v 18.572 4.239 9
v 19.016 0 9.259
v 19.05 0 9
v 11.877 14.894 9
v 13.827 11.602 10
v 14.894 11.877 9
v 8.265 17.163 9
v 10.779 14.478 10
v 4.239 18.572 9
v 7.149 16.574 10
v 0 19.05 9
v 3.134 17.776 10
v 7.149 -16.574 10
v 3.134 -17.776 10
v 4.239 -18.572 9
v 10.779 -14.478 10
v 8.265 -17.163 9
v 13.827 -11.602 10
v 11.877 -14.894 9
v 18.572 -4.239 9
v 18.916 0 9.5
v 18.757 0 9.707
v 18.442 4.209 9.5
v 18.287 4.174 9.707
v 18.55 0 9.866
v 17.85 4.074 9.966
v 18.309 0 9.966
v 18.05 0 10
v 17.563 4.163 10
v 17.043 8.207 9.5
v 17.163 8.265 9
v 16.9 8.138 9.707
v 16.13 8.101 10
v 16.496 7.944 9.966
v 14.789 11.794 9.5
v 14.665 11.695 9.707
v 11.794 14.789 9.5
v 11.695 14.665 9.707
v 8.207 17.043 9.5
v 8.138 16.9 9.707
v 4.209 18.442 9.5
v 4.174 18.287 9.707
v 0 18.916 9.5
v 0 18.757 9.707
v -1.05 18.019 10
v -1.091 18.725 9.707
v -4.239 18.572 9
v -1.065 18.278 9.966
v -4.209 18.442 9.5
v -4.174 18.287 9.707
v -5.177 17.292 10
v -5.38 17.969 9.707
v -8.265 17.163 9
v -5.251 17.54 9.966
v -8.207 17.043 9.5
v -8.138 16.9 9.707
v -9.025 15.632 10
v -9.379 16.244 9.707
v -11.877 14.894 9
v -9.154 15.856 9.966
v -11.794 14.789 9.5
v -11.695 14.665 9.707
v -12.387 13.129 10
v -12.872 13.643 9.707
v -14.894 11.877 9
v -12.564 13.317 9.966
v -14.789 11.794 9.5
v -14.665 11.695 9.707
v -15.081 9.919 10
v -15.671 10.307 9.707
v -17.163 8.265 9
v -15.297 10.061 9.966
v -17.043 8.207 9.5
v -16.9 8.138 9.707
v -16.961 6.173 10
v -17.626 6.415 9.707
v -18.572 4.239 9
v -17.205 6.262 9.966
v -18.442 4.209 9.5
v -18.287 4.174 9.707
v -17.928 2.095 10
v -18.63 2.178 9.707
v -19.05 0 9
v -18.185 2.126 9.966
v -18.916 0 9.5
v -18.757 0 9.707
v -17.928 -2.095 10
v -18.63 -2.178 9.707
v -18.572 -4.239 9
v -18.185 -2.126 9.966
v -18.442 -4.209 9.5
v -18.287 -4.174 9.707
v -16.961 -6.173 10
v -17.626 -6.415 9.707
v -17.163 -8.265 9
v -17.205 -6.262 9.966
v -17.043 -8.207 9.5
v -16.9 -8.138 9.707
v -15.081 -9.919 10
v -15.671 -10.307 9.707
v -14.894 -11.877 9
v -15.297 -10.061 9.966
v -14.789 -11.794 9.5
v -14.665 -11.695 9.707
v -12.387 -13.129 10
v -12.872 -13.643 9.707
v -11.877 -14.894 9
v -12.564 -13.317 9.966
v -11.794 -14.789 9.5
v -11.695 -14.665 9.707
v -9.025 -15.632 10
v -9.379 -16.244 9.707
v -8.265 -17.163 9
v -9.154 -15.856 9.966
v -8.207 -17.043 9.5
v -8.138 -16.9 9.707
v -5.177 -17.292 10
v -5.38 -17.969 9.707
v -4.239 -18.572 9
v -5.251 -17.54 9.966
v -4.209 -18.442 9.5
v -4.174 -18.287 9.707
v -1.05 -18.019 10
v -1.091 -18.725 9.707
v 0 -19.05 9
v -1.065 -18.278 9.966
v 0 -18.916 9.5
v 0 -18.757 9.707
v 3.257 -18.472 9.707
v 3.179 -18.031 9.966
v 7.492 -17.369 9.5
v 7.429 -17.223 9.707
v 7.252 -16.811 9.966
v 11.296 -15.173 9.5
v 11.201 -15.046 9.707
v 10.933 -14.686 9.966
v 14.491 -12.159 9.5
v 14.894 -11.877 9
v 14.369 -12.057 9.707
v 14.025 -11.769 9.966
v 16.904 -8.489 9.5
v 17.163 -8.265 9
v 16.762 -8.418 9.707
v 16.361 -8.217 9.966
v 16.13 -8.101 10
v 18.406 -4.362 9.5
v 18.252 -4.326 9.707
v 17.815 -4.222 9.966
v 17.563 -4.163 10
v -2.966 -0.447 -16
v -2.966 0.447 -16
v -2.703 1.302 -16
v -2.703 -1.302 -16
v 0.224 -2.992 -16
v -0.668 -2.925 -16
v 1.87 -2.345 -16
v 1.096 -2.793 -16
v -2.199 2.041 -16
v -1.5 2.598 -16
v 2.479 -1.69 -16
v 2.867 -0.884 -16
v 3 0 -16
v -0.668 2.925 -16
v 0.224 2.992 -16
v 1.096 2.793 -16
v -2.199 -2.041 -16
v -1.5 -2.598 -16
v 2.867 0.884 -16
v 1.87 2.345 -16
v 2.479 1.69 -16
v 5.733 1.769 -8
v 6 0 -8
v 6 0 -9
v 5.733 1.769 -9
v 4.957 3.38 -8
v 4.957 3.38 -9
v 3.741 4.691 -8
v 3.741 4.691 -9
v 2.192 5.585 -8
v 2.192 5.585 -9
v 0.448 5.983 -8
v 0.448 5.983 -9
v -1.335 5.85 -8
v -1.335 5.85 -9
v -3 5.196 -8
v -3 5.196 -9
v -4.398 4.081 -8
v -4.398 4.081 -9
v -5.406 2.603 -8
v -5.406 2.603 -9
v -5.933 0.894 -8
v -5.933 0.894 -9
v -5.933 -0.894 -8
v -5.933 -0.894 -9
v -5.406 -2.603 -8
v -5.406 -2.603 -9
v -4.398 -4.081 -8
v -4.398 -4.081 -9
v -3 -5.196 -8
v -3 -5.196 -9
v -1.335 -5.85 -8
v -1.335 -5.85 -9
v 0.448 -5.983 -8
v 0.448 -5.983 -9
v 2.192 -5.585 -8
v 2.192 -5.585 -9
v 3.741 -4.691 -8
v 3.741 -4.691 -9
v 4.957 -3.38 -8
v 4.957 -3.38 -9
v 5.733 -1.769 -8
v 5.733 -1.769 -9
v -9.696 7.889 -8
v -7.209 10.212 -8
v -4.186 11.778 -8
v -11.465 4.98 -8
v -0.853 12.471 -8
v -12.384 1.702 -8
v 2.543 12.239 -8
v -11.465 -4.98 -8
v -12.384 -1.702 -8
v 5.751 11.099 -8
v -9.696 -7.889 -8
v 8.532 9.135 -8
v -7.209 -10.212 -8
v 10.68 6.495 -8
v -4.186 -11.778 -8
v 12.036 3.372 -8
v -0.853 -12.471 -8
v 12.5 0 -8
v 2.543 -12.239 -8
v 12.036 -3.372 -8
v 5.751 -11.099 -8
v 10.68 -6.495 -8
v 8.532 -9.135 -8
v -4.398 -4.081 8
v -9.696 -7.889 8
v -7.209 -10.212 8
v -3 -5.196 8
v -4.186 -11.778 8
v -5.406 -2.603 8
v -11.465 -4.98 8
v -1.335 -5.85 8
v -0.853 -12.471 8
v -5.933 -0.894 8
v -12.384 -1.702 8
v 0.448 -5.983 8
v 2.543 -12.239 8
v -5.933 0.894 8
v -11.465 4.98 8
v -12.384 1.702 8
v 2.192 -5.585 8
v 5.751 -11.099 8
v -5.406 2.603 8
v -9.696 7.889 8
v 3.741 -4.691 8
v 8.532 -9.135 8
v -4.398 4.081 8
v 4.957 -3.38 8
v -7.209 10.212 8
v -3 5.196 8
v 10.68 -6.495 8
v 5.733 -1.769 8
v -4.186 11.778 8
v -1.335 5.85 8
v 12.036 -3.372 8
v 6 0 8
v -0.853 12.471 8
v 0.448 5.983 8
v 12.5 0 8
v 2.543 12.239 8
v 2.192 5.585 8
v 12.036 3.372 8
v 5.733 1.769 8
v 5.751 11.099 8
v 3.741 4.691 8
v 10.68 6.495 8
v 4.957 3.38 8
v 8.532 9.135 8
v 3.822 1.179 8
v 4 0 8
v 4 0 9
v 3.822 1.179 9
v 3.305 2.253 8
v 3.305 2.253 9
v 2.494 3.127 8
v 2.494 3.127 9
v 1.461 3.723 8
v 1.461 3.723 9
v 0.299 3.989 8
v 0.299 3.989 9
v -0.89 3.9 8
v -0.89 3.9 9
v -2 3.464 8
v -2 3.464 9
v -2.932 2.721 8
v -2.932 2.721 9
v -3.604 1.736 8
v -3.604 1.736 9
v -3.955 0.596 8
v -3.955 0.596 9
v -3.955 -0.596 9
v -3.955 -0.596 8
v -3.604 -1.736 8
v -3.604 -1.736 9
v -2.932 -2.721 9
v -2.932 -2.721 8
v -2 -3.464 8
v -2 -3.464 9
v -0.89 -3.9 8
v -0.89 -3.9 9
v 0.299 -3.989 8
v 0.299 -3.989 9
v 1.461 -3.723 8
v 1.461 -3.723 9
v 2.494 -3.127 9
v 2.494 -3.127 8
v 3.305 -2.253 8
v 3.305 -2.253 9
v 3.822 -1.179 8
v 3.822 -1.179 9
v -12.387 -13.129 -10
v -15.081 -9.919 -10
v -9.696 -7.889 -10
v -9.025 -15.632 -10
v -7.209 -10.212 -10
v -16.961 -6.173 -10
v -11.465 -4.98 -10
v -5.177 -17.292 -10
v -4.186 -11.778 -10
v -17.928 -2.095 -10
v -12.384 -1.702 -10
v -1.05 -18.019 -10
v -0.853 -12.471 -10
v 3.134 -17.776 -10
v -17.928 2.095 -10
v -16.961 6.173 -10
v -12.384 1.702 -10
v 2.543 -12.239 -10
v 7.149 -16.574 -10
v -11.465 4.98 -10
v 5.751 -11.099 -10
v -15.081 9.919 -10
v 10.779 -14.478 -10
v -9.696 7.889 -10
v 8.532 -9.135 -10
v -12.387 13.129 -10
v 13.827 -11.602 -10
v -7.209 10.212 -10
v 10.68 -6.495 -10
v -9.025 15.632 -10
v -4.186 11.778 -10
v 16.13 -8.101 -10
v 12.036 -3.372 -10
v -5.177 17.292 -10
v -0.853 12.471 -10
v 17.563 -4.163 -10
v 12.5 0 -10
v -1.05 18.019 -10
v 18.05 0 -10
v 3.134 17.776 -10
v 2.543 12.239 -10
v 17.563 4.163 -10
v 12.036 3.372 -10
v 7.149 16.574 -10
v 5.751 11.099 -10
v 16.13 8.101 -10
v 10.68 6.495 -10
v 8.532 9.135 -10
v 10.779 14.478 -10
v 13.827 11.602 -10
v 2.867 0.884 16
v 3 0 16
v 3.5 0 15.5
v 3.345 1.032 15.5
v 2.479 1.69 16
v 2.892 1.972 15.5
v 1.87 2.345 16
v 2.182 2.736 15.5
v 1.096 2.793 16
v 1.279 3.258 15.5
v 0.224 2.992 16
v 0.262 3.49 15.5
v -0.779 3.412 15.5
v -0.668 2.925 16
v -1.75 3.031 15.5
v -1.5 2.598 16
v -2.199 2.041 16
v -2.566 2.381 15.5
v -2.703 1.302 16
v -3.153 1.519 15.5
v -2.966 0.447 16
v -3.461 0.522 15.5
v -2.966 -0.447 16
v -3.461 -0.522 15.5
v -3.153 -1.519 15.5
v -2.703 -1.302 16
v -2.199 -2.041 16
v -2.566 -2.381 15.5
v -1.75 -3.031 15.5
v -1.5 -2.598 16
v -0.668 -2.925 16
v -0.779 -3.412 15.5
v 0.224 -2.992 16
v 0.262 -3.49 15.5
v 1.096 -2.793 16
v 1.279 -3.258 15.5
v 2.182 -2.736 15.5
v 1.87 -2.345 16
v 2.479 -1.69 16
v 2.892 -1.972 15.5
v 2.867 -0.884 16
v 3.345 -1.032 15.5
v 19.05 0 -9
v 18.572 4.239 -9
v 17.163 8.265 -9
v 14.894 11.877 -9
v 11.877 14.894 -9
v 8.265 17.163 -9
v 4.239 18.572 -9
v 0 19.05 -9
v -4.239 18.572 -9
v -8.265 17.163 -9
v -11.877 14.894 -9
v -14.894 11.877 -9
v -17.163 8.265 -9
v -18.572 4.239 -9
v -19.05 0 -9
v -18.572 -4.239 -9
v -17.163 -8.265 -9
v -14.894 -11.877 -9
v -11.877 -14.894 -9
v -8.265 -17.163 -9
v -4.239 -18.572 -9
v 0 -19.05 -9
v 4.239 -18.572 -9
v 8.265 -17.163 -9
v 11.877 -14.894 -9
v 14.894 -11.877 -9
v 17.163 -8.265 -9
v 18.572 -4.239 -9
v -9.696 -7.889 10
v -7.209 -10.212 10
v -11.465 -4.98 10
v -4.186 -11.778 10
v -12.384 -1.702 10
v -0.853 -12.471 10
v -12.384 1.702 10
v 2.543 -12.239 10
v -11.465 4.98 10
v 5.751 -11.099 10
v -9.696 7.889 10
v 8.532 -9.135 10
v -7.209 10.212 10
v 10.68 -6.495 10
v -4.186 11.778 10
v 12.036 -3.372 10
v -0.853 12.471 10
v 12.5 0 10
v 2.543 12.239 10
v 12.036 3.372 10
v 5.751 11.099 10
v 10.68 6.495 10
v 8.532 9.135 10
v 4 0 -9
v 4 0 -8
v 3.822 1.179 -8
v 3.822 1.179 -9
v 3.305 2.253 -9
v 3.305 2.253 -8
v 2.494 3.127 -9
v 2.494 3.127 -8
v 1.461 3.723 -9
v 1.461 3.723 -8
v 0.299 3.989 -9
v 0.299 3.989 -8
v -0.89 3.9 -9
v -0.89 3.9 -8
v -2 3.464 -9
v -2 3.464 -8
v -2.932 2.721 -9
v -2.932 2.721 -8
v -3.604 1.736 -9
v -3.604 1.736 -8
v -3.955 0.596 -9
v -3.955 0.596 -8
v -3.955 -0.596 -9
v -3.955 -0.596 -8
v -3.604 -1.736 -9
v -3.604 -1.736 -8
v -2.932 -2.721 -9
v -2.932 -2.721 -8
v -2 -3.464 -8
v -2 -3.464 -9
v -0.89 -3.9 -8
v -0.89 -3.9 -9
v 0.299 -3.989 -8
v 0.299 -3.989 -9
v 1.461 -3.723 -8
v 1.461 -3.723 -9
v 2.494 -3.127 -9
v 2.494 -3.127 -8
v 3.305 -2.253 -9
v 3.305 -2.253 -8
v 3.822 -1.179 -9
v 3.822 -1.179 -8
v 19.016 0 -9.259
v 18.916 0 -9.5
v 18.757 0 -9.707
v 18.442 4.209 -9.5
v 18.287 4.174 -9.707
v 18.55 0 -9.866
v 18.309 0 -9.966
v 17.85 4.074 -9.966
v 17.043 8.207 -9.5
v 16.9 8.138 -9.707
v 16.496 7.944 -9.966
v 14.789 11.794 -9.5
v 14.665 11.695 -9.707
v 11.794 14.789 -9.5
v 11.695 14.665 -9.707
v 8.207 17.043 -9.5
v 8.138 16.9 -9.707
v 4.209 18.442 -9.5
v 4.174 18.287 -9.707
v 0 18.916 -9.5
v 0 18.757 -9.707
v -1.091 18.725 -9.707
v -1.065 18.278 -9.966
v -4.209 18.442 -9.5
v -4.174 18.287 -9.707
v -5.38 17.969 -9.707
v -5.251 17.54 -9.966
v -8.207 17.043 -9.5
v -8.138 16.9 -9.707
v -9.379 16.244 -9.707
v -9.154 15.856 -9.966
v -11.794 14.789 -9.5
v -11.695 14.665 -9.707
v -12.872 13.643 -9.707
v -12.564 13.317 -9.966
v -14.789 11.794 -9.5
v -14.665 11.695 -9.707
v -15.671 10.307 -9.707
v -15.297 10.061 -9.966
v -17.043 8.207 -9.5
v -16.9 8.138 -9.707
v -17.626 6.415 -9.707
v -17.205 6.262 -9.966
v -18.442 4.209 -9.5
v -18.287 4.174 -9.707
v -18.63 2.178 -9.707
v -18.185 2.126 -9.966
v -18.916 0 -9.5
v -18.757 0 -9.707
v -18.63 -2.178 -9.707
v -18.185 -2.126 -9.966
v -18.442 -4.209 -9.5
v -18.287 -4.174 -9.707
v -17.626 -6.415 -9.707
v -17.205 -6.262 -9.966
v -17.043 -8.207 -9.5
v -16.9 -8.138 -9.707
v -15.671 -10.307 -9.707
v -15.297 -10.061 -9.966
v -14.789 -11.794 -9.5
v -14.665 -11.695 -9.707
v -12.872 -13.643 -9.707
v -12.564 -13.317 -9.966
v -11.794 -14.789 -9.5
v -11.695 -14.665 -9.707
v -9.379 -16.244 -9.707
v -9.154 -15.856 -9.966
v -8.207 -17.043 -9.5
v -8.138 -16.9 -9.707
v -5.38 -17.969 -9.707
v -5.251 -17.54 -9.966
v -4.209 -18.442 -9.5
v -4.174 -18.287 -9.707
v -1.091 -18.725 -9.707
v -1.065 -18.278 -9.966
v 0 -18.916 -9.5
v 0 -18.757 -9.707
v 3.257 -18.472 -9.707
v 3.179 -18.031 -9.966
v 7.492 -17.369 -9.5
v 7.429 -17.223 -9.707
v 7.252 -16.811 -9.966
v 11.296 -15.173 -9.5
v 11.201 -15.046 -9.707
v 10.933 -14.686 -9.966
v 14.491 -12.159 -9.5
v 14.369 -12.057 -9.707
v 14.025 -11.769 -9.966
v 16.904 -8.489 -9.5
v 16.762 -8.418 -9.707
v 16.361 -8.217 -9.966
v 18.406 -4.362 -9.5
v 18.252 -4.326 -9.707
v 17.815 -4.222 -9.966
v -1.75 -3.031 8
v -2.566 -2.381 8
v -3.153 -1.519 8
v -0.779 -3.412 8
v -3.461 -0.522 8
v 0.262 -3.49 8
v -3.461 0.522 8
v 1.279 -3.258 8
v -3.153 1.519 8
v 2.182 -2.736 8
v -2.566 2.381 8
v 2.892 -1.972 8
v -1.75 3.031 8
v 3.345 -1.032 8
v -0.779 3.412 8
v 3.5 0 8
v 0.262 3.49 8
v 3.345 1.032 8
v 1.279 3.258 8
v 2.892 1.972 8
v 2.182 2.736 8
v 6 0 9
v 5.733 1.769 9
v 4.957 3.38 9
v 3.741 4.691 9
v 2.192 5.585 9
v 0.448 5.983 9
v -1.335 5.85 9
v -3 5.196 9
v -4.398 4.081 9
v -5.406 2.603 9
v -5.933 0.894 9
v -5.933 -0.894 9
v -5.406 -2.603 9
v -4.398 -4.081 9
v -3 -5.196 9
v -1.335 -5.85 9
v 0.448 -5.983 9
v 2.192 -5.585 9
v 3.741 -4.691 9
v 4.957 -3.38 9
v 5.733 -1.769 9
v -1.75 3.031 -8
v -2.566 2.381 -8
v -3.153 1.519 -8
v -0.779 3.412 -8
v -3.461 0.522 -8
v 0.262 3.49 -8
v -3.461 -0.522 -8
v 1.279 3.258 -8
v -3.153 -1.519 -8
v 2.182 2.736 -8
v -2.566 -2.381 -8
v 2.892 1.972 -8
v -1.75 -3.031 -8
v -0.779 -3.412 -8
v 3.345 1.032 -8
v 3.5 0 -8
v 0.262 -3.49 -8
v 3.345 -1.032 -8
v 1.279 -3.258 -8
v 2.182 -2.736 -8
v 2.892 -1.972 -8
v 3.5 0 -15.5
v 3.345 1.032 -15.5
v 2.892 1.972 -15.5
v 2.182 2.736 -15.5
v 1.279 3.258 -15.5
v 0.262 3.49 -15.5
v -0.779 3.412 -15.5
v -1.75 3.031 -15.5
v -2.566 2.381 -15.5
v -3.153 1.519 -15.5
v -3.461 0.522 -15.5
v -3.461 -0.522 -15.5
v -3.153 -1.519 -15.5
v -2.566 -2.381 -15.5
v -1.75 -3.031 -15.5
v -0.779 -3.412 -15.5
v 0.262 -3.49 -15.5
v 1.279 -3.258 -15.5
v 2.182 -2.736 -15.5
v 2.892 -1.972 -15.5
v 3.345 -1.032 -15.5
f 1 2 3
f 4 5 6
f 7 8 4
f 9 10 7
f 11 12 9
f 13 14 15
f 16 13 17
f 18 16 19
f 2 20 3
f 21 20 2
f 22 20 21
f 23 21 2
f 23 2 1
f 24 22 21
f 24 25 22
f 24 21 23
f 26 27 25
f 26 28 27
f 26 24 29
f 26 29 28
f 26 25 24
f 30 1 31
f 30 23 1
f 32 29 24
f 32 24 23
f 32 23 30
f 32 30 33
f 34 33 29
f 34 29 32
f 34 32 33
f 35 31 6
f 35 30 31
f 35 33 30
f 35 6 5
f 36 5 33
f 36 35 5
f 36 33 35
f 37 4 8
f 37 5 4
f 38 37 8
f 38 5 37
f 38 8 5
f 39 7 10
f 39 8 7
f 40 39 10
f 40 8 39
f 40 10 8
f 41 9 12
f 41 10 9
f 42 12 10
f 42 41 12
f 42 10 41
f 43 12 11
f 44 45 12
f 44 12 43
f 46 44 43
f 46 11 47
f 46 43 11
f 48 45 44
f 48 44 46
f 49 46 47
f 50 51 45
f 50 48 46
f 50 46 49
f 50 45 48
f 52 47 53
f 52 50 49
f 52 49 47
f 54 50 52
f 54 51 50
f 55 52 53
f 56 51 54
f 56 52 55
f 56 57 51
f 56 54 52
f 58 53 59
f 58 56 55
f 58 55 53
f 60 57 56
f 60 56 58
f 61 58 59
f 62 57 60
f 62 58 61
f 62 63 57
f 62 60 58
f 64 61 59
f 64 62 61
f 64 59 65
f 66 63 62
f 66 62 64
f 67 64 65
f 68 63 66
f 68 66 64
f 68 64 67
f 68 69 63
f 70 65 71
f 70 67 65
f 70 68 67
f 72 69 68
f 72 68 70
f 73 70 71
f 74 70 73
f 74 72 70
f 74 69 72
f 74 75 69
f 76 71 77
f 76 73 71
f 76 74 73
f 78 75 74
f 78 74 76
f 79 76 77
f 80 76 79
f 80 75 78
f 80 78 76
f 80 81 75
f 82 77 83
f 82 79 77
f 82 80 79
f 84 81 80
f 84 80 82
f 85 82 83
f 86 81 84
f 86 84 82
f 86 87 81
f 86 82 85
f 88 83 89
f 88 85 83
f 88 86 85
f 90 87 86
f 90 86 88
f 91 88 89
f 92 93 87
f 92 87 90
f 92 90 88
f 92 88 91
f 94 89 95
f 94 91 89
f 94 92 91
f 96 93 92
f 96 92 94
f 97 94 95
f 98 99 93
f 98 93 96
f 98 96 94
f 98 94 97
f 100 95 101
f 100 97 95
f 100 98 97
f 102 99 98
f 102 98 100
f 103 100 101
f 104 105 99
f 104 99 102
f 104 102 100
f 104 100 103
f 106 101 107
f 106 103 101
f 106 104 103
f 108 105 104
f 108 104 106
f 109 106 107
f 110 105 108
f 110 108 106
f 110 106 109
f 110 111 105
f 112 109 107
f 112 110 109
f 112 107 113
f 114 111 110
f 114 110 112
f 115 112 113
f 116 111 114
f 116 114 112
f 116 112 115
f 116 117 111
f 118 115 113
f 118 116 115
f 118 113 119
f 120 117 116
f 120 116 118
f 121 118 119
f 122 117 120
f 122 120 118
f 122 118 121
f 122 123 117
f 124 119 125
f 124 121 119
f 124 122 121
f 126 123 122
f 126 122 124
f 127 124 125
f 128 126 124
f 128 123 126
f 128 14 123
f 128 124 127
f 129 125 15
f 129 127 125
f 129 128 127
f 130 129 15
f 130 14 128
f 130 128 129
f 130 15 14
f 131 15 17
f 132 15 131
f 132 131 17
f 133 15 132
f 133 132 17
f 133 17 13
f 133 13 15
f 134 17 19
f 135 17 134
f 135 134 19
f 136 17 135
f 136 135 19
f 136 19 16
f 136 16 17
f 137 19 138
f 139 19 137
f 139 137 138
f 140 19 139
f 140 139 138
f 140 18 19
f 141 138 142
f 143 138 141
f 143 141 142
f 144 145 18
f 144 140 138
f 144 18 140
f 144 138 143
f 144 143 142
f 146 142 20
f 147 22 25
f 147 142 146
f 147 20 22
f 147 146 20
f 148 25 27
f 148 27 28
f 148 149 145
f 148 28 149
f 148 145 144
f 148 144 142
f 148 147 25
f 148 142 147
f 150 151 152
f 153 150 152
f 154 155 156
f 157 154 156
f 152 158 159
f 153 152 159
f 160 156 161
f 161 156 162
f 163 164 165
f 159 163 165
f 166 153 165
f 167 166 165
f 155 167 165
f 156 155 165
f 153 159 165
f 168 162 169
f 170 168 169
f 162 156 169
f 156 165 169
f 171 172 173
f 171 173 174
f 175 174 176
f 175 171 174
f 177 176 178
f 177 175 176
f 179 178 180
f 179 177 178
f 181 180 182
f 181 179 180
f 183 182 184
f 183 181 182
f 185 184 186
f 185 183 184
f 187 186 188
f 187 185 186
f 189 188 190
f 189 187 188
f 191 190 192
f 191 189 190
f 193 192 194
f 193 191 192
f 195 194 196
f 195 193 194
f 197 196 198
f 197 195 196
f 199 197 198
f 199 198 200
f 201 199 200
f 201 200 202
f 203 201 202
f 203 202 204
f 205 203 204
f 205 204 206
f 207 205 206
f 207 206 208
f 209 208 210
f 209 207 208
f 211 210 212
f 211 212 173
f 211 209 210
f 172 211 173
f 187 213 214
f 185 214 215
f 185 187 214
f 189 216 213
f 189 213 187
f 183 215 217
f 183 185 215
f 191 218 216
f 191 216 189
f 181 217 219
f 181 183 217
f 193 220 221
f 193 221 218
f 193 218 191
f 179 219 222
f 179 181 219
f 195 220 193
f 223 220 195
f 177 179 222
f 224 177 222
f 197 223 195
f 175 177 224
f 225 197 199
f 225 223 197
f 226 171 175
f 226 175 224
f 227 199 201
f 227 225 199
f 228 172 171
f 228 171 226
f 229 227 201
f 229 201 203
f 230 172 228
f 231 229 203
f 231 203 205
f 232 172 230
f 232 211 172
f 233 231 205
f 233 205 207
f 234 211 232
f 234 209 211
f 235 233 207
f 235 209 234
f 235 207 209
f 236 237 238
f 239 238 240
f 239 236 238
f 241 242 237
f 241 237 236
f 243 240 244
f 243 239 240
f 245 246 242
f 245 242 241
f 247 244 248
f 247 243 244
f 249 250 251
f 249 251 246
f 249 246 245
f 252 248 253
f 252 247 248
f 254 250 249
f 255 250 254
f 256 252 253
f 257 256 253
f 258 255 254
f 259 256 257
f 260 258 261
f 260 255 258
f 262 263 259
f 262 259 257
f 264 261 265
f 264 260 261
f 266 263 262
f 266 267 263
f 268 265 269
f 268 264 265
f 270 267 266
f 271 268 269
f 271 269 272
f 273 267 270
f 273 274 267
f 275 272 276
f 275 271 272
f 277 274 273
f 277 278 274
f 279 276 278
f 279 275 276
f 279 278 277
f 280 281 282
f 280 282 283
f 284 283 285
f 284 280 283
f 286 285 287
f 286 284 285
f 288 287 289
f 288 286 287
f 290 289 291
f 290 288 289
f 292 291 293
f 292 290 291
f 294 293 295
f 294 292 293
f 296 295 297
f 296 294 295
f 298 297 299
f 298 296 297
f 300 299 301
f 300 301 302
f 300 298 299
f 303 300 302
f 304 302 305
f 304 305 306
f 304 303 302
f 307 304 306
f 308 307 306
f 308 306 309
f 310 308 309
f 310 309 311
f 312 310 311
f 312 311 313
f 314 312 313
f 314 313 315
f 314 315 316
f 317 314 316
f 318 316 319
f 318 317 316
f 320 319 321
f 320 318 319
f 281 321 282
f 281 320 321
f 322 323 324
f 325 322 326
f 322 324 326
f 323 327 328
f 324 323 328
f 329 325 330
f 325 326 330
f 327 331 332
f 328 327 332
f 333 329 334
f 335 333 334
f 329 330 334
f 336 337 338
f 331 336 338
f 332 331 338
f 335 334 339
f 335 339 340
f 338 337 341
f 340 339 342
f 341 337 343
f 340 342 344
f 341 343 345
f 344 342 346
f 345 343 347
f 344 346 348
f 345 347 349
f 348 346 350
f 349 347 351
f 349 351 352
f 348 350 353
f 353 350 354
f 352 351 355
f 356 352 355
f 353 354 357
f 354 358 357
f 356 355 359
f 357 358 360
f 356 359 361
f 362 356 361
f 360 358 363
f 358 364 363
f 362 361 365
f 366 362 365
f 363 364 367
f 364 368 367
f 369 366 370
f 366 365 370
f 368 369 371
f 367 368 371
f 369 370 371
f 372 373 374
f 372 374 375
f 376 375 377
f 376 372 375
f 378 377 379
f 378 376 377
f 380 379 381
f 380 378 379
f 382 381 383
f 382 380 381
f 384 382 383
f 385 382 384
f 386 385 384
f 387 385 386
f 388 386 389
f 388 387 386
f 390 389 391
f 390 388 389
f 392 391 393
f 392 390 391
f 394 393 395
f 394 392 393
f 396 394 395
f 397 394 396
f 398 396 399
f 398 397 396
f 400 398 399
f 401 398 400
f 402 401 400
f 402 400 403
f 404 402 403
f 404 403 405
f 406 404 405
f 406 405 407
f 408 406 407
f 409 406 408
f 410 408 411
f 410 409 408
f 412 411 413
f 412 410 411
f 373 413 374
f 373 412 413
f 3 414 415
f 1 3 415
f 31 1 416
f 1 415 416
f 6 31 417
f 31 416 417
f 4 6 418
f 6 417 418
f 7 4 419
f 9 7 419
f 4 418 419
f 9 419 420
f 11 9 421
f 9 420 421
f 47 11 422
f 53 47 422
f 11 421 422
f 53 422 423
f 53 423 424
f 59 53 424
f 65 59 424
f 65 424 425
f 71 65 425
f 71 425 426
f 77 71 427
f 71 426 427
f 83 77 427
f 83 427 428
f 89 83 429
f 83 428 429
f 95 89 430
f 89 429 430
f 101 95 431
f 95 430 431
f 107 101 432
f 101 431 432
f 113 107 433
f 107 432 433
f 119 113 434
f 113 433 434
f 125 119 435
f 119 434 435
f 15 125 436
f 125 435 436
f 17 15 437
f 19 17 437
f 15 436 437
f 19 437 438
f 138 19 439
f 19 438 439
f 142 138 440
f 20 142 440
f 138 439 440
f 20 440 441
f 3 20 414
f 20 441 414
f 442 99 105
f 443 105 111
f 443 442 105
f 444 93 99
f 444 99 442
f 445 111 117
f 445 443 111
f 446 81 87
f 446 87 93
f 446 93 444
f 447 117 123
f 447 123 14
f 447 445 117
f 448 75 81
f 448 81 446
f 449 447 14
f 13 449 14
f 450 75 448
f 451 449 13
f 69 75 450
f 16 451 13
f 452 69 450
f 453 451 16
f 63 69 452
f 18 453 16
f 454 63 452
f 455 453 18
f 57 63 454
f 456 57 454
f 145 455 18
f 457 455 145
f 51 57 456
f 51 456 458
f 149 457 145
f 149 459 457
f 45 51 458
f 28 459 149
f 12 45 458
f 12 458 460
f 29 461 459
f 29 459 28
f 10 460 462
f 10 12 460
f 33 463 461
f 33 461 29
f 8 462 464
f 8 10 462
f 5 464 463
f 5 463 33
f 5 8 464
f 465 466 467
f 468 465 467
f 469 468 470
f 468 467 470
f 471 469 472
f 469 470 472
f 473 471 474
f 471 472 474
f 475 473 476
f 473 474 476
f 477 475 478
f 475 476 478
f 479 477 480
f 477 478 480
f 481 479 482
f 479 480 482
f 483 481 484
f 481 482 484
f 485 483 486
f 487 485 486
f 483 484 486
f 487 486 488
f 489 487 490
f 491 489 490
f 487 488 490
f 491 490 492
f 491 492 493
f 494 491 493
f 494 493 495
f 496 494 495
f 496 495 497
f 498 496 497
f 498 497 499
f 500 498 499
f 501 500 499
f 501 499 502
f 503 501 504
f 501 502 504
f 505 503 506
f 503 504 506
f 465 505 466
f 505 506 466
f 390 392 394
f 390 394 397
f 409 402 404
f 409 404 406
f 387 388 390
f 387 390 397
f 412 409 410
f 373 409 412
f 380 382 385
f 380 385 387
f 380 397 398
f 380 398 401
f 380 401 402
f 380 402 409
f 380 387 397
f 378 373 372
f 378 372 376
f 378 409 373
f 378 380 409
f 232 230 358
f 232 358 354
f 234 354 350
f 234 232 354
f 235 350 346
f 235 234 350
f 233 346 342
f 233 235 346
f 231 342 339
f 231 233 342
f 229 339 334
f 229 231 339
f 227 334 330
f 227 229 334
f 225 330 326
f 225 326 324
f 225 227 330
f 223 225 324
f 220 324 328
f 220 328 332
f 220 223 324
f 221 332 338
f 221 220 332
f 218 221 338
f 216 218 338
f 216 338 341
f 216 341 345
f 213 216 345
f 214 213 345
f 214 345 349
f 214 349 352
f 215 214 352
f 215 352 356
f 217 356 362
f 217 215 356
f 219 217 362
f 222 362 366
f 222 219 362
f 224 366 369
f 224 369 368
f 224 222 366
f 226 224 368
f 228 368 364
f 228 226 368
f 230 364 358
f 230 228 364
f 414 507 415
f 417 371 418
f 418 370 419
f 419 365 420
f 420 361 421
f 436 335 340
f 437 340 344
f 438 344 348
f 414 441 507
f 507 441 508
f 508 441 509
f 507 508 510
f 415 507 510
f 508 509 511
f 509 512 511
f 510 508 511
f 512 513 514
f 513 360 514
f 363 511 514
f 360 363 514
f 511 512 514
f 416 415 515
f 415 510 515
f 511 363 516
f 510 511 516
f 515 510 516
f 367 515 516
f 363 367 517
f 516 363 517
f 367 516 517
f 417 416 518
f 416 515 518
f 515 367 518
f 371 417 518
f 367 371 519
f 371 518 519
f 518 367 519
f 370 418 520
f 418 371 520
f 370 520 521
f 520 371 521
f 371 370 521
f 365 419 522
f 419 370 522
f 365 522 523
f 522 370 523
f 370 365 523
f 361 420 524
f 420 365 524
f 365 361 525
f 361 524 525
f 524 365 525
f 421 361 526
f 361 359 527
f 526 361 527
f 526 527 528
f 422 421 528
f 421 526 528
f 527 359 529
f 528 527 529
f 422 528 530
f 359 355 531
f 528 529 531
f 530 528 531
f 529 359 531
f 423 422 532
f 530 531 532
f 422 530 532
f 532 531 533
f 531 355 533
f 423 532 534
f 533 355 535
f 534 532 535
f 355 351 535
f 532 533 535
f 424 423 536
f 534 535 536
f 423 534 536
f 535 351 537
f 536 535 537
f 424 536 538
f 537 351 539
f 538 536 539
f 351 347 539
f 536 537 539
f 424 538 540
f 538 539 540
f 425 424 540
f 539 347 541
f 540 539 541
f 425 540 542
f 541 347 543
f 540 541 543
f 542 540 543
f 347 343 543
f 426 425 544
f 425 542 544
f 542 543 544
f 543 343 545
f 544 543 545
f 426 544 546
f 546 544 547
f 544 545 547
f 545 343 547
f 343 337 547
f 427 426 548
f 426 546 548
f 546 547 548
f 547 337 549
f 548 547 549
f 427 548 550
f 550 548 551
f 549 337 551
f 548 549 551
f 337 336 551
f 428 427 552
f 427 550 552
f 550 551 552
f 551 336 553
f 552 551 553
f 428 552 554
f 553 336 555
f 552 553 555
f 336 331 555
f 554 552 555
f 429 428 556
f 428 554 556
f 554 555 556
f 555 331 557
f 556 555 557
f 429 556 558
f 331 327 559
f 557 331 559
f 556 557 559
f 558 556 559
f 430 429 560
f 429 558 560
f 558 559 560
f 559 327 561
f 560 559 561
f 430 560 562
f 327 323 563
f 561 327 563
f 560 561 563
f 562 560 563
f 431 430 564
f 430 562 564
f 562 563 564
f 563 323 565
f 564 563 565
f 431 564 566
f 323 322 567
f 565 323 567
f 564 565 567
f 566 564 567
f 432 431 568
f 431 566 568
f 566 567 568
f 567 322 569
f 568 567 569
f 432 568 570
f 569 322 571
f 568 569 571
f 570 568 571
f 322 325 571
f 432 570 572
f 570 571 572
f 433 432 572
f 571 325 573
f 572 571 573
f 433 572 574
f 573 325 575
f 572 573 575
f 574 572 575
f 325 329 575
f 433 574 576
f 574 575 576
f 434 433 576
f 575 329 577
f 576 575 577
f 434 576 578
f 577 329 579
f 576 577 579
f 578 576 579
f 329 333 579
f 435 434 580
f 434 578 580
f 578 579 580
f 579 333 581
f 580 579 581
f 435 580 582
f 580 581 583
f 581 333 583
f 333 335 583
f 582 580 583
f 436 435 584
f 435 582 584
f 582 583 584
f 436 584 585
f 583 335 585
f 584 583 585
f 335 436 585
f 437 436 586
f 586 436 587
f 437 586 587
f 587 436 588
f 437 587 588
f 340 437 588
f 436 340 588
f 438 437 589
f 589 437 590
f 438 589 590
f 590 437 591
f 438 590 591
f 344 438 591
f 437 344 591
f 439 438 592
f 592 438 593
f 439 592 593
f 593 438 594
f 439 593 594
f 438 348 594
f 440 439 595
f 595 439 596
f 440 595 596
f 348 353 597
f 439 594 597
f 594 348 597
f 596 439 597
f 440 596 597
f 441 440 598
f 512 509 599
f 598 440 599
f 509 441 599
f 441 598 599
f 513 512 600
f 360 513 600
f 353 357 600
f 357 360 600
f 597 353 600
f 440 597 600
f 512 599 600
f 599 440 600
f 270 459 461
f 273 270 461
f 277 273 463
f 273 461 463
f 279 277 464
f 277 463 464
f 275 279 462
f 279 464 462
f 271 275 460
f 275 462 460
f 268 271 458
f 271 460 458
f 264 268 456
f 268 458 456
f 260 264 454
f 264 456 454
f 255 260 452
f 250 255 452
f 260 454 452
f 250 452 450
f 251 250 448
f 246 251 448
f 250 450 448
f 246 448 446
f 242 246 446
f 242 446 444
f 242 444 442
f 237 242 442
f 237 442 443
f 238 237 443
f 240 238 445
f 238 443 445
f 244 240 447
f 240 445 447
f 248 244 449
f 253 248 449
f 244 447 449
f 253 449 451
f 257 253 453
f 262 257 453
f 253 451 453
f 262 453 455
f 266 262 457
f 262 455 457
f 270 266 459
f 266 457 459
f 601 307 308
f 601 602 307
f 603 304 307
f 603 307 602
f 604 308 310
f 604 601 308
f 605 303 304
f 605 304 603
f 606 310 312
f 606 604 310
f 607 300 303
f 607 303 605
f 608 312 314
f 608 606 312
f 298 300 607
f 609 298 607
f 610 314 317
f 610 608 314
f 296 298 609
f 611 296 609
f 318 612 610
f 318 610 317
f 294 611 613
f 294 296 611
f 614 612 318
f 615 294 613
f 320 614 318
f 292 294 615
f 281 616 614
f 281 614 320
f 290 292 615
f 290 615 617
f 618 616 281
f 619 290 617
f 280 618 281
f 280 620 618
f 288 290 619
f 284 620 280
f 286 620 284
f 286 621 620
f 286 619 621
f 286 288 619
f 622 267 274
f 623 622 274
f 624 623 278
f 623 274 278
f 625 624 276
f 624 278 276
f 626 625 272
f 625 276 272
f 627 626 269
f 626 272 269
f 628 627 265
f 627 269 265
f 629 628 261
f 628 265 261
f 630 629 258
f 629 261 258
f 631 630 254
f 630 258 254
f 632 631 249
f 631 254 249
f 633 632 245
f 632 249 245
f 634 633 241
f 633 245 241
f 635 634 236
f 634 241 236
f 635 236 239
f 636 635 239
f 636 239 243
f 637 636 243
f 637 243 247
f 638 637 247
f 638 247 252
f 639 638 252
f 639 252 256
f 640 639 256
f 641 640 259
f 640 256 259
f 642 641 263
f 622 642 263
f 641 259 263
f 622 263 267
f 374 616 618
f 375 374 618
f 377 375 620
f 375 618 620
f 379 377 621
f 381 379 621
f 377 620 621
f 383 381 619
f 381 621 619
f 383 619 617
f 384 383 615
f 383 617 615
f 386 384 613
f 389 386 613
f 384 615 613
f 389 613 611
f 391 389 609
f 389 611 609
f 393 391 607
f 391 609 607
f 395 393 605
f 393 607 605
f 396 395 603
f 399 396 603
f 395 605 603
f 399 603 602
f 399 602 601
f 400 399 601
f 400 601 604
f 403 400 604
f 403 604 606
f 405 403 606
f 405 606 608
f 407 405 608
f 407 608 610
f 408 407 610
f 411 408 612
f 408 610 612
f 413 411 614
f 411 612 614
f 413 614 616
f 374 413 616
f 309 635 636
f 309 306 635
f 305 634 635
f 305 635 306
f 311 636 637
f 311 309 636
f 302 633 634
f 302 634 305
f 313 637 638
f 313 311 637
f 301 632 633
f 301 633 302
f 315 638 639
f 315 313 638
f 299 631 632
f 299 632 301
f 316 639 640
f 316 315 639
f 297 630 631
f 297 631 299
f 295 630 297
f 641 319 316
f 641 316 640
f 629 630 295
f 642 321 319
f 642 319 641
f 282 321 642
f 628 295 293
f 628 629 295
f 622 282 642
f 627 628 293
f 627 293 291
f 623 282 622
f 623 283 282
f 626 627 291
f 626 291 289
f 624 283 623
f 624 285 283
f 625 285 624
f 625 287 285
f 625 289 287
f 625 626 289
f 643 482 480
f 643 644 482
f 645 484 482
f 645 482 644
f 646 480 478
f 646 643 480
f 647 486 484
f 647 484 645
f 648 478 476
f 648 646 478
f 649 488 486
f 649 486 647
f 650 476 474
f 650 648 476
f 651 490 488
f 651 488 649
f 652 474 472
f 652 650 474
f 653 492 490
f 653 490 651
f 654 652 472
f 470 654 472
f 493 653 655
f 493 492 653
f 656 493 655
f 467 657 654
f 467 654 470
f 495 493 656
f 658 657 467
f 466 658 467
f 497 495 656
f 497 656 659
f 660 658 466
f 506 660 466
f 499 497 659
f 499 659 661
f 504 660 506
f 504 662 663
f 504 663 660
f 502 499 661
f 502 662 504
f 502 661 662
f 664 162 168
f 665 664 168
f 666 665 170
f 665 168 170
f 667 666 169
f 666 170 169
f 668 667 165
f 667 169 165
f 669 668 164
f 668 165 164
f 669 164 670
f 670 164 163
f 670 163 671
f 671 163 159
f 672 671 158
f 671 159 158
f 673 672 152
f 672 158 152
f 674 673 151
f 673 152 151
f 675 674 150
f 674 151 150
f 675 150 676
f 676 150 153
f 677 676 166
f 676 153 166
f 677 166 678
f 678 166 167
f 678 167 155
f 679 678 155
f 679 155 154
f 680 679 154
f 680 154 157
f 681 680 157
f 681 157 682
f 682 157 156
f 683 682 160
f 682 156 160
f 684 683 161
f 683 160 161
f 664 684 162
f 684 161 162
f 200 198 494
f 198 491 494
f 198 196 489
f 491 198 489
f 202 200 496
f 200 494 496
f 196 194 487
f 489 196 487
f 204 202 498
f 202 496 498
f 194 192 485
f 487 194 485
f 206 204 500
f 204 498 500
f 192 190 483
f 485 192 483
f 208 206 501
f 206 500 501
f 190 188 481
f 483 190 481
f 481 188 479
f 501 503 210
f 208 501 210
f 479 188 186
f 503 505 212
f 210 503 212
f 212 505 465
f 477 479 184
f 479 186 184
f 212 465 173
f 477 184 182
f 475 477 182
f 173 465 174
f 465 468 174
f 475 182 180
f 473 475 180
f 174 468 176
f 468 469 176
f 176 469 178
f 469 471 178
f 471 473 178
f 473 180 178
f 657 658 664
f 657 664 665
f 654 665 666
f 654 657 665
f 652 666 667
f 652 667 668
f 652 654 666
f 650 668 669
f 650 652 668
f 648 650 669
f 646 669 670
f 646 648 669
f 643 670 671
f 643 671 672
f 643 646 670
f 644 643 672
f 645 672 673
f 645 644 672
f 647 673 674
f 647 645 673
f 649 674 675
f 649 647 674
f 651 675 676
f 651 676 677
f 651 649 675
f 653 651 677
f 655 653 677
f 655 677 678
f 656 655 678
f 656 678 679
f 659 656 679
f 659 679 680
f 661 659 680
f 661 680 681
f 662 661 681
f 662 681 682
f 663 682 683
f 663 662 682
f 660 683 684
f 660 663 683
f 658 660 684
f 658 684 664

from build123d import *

# Parameters (mm, degrees)
BOSS_EXTRUDE1_DEPTH      = 10
BOSS_EXTRUDE1_DEPTH_BACK = 10
SKETCH1_R                = 19.05
FILLET1_R                = 1
SKETCH2_R                = 12.5
CUT_EXTRUDE1_DEPTH       = 2
CUT_EXTRUDE2_START       = -2
SKETCH3_R                = 12.5
CUT_EXTRUDE2_DEPTH       = 2
SKETCH4_R                = 6
SKETCH4_R_2              = 4
BOSS_EXTRUDE2_DEPTH      = 1
SKETCH5_R                = 3.5
BOSS_EXTRUDE3_DEPTH      = 8
CHAMFER1_SIZE            = 0.5


with BuildPart() as part:
    # Sketch1 → Boss-Extrude1 (new, two sides: drawn at the far end of the back side and taken through both)
    with BuildSketch(Plane.XY.offset(-BOSS_EXTRUDE1_DEPTH_BACK)):
        Circle(SKETCH1_R)
    extrude(amount=BOSS_EXTRUDE1_DEPTH + BOSS_EXTRUDE1_DEPTH_BACK)

    # Fillet1
    fillet1_edges = [part.edges().sort_by_distance(p)[0] for p in [
        (-19.05, 0, -10),
        (-19.05, 0, 10),
    ]]
    fillet(fillet1_edges, radius=FILLET1_R)

    # Sketch2 → Cut-Extrude1 (cut)
    with BuildSketch(Plane.XY.offset(10)):
        Circle(SKETCH2_R)
    extrude(amount=-CUT_EXTRUDE1_DEPTH, mode=Mode.SUBTRACT)

    # Sketch3 → Cut-Extrude2 (cut)
    with BuildSketch(Plane(origin=(0, 0, -10), x_dir=(-1, 0, 0), z_dir=(0, 0, -1)).offset(CUT_EXTRUDE2_START)):
        Circle(SKETCH3_R)
    extrude(amount=CUT_EXTRUDE2_DEPTH, mode=Mode.SUBTRACT)

    # Sketch4 → Boss-Extrude2 (add)
    with BuildSketch(Plane.XY.offset(8)):
        Circle(SKETCH4_R)
        Circle(SKETCH4_R_2, mode=Mode.SUBTRACT)
    boss_extrude2 = extrude(amount=BOSS_EXTRUDE2_DEPTH)

    # Mirror1: Boss-Extrude2 across plane
    add(boss_extrude2.mirror(Plane.XY))

    # Sketch5 → Boss-Extrude3 (add)
    with BuildSketch(Plane.XY.offset(8)):
        Circle(SKETCH5_R)
    boss_extrude3 = extrude(amount=BOSS_EXTRUDE3_DEPTH)

    # Mirror2: Boss-Extrude3 across plane
    add(boss_extrude3.mirror(Plane.XY))

    # Chamfer1
    chamfer1_edges = [part.edges().sort_by_distance(p)[0] for p in [
        (-3.5, 0, -16),
        (-3.5, 0, 16),
    ]]
    chamfer(chamfer1_edges, length=CHAMFER1_SIZE)


solid = part.part
